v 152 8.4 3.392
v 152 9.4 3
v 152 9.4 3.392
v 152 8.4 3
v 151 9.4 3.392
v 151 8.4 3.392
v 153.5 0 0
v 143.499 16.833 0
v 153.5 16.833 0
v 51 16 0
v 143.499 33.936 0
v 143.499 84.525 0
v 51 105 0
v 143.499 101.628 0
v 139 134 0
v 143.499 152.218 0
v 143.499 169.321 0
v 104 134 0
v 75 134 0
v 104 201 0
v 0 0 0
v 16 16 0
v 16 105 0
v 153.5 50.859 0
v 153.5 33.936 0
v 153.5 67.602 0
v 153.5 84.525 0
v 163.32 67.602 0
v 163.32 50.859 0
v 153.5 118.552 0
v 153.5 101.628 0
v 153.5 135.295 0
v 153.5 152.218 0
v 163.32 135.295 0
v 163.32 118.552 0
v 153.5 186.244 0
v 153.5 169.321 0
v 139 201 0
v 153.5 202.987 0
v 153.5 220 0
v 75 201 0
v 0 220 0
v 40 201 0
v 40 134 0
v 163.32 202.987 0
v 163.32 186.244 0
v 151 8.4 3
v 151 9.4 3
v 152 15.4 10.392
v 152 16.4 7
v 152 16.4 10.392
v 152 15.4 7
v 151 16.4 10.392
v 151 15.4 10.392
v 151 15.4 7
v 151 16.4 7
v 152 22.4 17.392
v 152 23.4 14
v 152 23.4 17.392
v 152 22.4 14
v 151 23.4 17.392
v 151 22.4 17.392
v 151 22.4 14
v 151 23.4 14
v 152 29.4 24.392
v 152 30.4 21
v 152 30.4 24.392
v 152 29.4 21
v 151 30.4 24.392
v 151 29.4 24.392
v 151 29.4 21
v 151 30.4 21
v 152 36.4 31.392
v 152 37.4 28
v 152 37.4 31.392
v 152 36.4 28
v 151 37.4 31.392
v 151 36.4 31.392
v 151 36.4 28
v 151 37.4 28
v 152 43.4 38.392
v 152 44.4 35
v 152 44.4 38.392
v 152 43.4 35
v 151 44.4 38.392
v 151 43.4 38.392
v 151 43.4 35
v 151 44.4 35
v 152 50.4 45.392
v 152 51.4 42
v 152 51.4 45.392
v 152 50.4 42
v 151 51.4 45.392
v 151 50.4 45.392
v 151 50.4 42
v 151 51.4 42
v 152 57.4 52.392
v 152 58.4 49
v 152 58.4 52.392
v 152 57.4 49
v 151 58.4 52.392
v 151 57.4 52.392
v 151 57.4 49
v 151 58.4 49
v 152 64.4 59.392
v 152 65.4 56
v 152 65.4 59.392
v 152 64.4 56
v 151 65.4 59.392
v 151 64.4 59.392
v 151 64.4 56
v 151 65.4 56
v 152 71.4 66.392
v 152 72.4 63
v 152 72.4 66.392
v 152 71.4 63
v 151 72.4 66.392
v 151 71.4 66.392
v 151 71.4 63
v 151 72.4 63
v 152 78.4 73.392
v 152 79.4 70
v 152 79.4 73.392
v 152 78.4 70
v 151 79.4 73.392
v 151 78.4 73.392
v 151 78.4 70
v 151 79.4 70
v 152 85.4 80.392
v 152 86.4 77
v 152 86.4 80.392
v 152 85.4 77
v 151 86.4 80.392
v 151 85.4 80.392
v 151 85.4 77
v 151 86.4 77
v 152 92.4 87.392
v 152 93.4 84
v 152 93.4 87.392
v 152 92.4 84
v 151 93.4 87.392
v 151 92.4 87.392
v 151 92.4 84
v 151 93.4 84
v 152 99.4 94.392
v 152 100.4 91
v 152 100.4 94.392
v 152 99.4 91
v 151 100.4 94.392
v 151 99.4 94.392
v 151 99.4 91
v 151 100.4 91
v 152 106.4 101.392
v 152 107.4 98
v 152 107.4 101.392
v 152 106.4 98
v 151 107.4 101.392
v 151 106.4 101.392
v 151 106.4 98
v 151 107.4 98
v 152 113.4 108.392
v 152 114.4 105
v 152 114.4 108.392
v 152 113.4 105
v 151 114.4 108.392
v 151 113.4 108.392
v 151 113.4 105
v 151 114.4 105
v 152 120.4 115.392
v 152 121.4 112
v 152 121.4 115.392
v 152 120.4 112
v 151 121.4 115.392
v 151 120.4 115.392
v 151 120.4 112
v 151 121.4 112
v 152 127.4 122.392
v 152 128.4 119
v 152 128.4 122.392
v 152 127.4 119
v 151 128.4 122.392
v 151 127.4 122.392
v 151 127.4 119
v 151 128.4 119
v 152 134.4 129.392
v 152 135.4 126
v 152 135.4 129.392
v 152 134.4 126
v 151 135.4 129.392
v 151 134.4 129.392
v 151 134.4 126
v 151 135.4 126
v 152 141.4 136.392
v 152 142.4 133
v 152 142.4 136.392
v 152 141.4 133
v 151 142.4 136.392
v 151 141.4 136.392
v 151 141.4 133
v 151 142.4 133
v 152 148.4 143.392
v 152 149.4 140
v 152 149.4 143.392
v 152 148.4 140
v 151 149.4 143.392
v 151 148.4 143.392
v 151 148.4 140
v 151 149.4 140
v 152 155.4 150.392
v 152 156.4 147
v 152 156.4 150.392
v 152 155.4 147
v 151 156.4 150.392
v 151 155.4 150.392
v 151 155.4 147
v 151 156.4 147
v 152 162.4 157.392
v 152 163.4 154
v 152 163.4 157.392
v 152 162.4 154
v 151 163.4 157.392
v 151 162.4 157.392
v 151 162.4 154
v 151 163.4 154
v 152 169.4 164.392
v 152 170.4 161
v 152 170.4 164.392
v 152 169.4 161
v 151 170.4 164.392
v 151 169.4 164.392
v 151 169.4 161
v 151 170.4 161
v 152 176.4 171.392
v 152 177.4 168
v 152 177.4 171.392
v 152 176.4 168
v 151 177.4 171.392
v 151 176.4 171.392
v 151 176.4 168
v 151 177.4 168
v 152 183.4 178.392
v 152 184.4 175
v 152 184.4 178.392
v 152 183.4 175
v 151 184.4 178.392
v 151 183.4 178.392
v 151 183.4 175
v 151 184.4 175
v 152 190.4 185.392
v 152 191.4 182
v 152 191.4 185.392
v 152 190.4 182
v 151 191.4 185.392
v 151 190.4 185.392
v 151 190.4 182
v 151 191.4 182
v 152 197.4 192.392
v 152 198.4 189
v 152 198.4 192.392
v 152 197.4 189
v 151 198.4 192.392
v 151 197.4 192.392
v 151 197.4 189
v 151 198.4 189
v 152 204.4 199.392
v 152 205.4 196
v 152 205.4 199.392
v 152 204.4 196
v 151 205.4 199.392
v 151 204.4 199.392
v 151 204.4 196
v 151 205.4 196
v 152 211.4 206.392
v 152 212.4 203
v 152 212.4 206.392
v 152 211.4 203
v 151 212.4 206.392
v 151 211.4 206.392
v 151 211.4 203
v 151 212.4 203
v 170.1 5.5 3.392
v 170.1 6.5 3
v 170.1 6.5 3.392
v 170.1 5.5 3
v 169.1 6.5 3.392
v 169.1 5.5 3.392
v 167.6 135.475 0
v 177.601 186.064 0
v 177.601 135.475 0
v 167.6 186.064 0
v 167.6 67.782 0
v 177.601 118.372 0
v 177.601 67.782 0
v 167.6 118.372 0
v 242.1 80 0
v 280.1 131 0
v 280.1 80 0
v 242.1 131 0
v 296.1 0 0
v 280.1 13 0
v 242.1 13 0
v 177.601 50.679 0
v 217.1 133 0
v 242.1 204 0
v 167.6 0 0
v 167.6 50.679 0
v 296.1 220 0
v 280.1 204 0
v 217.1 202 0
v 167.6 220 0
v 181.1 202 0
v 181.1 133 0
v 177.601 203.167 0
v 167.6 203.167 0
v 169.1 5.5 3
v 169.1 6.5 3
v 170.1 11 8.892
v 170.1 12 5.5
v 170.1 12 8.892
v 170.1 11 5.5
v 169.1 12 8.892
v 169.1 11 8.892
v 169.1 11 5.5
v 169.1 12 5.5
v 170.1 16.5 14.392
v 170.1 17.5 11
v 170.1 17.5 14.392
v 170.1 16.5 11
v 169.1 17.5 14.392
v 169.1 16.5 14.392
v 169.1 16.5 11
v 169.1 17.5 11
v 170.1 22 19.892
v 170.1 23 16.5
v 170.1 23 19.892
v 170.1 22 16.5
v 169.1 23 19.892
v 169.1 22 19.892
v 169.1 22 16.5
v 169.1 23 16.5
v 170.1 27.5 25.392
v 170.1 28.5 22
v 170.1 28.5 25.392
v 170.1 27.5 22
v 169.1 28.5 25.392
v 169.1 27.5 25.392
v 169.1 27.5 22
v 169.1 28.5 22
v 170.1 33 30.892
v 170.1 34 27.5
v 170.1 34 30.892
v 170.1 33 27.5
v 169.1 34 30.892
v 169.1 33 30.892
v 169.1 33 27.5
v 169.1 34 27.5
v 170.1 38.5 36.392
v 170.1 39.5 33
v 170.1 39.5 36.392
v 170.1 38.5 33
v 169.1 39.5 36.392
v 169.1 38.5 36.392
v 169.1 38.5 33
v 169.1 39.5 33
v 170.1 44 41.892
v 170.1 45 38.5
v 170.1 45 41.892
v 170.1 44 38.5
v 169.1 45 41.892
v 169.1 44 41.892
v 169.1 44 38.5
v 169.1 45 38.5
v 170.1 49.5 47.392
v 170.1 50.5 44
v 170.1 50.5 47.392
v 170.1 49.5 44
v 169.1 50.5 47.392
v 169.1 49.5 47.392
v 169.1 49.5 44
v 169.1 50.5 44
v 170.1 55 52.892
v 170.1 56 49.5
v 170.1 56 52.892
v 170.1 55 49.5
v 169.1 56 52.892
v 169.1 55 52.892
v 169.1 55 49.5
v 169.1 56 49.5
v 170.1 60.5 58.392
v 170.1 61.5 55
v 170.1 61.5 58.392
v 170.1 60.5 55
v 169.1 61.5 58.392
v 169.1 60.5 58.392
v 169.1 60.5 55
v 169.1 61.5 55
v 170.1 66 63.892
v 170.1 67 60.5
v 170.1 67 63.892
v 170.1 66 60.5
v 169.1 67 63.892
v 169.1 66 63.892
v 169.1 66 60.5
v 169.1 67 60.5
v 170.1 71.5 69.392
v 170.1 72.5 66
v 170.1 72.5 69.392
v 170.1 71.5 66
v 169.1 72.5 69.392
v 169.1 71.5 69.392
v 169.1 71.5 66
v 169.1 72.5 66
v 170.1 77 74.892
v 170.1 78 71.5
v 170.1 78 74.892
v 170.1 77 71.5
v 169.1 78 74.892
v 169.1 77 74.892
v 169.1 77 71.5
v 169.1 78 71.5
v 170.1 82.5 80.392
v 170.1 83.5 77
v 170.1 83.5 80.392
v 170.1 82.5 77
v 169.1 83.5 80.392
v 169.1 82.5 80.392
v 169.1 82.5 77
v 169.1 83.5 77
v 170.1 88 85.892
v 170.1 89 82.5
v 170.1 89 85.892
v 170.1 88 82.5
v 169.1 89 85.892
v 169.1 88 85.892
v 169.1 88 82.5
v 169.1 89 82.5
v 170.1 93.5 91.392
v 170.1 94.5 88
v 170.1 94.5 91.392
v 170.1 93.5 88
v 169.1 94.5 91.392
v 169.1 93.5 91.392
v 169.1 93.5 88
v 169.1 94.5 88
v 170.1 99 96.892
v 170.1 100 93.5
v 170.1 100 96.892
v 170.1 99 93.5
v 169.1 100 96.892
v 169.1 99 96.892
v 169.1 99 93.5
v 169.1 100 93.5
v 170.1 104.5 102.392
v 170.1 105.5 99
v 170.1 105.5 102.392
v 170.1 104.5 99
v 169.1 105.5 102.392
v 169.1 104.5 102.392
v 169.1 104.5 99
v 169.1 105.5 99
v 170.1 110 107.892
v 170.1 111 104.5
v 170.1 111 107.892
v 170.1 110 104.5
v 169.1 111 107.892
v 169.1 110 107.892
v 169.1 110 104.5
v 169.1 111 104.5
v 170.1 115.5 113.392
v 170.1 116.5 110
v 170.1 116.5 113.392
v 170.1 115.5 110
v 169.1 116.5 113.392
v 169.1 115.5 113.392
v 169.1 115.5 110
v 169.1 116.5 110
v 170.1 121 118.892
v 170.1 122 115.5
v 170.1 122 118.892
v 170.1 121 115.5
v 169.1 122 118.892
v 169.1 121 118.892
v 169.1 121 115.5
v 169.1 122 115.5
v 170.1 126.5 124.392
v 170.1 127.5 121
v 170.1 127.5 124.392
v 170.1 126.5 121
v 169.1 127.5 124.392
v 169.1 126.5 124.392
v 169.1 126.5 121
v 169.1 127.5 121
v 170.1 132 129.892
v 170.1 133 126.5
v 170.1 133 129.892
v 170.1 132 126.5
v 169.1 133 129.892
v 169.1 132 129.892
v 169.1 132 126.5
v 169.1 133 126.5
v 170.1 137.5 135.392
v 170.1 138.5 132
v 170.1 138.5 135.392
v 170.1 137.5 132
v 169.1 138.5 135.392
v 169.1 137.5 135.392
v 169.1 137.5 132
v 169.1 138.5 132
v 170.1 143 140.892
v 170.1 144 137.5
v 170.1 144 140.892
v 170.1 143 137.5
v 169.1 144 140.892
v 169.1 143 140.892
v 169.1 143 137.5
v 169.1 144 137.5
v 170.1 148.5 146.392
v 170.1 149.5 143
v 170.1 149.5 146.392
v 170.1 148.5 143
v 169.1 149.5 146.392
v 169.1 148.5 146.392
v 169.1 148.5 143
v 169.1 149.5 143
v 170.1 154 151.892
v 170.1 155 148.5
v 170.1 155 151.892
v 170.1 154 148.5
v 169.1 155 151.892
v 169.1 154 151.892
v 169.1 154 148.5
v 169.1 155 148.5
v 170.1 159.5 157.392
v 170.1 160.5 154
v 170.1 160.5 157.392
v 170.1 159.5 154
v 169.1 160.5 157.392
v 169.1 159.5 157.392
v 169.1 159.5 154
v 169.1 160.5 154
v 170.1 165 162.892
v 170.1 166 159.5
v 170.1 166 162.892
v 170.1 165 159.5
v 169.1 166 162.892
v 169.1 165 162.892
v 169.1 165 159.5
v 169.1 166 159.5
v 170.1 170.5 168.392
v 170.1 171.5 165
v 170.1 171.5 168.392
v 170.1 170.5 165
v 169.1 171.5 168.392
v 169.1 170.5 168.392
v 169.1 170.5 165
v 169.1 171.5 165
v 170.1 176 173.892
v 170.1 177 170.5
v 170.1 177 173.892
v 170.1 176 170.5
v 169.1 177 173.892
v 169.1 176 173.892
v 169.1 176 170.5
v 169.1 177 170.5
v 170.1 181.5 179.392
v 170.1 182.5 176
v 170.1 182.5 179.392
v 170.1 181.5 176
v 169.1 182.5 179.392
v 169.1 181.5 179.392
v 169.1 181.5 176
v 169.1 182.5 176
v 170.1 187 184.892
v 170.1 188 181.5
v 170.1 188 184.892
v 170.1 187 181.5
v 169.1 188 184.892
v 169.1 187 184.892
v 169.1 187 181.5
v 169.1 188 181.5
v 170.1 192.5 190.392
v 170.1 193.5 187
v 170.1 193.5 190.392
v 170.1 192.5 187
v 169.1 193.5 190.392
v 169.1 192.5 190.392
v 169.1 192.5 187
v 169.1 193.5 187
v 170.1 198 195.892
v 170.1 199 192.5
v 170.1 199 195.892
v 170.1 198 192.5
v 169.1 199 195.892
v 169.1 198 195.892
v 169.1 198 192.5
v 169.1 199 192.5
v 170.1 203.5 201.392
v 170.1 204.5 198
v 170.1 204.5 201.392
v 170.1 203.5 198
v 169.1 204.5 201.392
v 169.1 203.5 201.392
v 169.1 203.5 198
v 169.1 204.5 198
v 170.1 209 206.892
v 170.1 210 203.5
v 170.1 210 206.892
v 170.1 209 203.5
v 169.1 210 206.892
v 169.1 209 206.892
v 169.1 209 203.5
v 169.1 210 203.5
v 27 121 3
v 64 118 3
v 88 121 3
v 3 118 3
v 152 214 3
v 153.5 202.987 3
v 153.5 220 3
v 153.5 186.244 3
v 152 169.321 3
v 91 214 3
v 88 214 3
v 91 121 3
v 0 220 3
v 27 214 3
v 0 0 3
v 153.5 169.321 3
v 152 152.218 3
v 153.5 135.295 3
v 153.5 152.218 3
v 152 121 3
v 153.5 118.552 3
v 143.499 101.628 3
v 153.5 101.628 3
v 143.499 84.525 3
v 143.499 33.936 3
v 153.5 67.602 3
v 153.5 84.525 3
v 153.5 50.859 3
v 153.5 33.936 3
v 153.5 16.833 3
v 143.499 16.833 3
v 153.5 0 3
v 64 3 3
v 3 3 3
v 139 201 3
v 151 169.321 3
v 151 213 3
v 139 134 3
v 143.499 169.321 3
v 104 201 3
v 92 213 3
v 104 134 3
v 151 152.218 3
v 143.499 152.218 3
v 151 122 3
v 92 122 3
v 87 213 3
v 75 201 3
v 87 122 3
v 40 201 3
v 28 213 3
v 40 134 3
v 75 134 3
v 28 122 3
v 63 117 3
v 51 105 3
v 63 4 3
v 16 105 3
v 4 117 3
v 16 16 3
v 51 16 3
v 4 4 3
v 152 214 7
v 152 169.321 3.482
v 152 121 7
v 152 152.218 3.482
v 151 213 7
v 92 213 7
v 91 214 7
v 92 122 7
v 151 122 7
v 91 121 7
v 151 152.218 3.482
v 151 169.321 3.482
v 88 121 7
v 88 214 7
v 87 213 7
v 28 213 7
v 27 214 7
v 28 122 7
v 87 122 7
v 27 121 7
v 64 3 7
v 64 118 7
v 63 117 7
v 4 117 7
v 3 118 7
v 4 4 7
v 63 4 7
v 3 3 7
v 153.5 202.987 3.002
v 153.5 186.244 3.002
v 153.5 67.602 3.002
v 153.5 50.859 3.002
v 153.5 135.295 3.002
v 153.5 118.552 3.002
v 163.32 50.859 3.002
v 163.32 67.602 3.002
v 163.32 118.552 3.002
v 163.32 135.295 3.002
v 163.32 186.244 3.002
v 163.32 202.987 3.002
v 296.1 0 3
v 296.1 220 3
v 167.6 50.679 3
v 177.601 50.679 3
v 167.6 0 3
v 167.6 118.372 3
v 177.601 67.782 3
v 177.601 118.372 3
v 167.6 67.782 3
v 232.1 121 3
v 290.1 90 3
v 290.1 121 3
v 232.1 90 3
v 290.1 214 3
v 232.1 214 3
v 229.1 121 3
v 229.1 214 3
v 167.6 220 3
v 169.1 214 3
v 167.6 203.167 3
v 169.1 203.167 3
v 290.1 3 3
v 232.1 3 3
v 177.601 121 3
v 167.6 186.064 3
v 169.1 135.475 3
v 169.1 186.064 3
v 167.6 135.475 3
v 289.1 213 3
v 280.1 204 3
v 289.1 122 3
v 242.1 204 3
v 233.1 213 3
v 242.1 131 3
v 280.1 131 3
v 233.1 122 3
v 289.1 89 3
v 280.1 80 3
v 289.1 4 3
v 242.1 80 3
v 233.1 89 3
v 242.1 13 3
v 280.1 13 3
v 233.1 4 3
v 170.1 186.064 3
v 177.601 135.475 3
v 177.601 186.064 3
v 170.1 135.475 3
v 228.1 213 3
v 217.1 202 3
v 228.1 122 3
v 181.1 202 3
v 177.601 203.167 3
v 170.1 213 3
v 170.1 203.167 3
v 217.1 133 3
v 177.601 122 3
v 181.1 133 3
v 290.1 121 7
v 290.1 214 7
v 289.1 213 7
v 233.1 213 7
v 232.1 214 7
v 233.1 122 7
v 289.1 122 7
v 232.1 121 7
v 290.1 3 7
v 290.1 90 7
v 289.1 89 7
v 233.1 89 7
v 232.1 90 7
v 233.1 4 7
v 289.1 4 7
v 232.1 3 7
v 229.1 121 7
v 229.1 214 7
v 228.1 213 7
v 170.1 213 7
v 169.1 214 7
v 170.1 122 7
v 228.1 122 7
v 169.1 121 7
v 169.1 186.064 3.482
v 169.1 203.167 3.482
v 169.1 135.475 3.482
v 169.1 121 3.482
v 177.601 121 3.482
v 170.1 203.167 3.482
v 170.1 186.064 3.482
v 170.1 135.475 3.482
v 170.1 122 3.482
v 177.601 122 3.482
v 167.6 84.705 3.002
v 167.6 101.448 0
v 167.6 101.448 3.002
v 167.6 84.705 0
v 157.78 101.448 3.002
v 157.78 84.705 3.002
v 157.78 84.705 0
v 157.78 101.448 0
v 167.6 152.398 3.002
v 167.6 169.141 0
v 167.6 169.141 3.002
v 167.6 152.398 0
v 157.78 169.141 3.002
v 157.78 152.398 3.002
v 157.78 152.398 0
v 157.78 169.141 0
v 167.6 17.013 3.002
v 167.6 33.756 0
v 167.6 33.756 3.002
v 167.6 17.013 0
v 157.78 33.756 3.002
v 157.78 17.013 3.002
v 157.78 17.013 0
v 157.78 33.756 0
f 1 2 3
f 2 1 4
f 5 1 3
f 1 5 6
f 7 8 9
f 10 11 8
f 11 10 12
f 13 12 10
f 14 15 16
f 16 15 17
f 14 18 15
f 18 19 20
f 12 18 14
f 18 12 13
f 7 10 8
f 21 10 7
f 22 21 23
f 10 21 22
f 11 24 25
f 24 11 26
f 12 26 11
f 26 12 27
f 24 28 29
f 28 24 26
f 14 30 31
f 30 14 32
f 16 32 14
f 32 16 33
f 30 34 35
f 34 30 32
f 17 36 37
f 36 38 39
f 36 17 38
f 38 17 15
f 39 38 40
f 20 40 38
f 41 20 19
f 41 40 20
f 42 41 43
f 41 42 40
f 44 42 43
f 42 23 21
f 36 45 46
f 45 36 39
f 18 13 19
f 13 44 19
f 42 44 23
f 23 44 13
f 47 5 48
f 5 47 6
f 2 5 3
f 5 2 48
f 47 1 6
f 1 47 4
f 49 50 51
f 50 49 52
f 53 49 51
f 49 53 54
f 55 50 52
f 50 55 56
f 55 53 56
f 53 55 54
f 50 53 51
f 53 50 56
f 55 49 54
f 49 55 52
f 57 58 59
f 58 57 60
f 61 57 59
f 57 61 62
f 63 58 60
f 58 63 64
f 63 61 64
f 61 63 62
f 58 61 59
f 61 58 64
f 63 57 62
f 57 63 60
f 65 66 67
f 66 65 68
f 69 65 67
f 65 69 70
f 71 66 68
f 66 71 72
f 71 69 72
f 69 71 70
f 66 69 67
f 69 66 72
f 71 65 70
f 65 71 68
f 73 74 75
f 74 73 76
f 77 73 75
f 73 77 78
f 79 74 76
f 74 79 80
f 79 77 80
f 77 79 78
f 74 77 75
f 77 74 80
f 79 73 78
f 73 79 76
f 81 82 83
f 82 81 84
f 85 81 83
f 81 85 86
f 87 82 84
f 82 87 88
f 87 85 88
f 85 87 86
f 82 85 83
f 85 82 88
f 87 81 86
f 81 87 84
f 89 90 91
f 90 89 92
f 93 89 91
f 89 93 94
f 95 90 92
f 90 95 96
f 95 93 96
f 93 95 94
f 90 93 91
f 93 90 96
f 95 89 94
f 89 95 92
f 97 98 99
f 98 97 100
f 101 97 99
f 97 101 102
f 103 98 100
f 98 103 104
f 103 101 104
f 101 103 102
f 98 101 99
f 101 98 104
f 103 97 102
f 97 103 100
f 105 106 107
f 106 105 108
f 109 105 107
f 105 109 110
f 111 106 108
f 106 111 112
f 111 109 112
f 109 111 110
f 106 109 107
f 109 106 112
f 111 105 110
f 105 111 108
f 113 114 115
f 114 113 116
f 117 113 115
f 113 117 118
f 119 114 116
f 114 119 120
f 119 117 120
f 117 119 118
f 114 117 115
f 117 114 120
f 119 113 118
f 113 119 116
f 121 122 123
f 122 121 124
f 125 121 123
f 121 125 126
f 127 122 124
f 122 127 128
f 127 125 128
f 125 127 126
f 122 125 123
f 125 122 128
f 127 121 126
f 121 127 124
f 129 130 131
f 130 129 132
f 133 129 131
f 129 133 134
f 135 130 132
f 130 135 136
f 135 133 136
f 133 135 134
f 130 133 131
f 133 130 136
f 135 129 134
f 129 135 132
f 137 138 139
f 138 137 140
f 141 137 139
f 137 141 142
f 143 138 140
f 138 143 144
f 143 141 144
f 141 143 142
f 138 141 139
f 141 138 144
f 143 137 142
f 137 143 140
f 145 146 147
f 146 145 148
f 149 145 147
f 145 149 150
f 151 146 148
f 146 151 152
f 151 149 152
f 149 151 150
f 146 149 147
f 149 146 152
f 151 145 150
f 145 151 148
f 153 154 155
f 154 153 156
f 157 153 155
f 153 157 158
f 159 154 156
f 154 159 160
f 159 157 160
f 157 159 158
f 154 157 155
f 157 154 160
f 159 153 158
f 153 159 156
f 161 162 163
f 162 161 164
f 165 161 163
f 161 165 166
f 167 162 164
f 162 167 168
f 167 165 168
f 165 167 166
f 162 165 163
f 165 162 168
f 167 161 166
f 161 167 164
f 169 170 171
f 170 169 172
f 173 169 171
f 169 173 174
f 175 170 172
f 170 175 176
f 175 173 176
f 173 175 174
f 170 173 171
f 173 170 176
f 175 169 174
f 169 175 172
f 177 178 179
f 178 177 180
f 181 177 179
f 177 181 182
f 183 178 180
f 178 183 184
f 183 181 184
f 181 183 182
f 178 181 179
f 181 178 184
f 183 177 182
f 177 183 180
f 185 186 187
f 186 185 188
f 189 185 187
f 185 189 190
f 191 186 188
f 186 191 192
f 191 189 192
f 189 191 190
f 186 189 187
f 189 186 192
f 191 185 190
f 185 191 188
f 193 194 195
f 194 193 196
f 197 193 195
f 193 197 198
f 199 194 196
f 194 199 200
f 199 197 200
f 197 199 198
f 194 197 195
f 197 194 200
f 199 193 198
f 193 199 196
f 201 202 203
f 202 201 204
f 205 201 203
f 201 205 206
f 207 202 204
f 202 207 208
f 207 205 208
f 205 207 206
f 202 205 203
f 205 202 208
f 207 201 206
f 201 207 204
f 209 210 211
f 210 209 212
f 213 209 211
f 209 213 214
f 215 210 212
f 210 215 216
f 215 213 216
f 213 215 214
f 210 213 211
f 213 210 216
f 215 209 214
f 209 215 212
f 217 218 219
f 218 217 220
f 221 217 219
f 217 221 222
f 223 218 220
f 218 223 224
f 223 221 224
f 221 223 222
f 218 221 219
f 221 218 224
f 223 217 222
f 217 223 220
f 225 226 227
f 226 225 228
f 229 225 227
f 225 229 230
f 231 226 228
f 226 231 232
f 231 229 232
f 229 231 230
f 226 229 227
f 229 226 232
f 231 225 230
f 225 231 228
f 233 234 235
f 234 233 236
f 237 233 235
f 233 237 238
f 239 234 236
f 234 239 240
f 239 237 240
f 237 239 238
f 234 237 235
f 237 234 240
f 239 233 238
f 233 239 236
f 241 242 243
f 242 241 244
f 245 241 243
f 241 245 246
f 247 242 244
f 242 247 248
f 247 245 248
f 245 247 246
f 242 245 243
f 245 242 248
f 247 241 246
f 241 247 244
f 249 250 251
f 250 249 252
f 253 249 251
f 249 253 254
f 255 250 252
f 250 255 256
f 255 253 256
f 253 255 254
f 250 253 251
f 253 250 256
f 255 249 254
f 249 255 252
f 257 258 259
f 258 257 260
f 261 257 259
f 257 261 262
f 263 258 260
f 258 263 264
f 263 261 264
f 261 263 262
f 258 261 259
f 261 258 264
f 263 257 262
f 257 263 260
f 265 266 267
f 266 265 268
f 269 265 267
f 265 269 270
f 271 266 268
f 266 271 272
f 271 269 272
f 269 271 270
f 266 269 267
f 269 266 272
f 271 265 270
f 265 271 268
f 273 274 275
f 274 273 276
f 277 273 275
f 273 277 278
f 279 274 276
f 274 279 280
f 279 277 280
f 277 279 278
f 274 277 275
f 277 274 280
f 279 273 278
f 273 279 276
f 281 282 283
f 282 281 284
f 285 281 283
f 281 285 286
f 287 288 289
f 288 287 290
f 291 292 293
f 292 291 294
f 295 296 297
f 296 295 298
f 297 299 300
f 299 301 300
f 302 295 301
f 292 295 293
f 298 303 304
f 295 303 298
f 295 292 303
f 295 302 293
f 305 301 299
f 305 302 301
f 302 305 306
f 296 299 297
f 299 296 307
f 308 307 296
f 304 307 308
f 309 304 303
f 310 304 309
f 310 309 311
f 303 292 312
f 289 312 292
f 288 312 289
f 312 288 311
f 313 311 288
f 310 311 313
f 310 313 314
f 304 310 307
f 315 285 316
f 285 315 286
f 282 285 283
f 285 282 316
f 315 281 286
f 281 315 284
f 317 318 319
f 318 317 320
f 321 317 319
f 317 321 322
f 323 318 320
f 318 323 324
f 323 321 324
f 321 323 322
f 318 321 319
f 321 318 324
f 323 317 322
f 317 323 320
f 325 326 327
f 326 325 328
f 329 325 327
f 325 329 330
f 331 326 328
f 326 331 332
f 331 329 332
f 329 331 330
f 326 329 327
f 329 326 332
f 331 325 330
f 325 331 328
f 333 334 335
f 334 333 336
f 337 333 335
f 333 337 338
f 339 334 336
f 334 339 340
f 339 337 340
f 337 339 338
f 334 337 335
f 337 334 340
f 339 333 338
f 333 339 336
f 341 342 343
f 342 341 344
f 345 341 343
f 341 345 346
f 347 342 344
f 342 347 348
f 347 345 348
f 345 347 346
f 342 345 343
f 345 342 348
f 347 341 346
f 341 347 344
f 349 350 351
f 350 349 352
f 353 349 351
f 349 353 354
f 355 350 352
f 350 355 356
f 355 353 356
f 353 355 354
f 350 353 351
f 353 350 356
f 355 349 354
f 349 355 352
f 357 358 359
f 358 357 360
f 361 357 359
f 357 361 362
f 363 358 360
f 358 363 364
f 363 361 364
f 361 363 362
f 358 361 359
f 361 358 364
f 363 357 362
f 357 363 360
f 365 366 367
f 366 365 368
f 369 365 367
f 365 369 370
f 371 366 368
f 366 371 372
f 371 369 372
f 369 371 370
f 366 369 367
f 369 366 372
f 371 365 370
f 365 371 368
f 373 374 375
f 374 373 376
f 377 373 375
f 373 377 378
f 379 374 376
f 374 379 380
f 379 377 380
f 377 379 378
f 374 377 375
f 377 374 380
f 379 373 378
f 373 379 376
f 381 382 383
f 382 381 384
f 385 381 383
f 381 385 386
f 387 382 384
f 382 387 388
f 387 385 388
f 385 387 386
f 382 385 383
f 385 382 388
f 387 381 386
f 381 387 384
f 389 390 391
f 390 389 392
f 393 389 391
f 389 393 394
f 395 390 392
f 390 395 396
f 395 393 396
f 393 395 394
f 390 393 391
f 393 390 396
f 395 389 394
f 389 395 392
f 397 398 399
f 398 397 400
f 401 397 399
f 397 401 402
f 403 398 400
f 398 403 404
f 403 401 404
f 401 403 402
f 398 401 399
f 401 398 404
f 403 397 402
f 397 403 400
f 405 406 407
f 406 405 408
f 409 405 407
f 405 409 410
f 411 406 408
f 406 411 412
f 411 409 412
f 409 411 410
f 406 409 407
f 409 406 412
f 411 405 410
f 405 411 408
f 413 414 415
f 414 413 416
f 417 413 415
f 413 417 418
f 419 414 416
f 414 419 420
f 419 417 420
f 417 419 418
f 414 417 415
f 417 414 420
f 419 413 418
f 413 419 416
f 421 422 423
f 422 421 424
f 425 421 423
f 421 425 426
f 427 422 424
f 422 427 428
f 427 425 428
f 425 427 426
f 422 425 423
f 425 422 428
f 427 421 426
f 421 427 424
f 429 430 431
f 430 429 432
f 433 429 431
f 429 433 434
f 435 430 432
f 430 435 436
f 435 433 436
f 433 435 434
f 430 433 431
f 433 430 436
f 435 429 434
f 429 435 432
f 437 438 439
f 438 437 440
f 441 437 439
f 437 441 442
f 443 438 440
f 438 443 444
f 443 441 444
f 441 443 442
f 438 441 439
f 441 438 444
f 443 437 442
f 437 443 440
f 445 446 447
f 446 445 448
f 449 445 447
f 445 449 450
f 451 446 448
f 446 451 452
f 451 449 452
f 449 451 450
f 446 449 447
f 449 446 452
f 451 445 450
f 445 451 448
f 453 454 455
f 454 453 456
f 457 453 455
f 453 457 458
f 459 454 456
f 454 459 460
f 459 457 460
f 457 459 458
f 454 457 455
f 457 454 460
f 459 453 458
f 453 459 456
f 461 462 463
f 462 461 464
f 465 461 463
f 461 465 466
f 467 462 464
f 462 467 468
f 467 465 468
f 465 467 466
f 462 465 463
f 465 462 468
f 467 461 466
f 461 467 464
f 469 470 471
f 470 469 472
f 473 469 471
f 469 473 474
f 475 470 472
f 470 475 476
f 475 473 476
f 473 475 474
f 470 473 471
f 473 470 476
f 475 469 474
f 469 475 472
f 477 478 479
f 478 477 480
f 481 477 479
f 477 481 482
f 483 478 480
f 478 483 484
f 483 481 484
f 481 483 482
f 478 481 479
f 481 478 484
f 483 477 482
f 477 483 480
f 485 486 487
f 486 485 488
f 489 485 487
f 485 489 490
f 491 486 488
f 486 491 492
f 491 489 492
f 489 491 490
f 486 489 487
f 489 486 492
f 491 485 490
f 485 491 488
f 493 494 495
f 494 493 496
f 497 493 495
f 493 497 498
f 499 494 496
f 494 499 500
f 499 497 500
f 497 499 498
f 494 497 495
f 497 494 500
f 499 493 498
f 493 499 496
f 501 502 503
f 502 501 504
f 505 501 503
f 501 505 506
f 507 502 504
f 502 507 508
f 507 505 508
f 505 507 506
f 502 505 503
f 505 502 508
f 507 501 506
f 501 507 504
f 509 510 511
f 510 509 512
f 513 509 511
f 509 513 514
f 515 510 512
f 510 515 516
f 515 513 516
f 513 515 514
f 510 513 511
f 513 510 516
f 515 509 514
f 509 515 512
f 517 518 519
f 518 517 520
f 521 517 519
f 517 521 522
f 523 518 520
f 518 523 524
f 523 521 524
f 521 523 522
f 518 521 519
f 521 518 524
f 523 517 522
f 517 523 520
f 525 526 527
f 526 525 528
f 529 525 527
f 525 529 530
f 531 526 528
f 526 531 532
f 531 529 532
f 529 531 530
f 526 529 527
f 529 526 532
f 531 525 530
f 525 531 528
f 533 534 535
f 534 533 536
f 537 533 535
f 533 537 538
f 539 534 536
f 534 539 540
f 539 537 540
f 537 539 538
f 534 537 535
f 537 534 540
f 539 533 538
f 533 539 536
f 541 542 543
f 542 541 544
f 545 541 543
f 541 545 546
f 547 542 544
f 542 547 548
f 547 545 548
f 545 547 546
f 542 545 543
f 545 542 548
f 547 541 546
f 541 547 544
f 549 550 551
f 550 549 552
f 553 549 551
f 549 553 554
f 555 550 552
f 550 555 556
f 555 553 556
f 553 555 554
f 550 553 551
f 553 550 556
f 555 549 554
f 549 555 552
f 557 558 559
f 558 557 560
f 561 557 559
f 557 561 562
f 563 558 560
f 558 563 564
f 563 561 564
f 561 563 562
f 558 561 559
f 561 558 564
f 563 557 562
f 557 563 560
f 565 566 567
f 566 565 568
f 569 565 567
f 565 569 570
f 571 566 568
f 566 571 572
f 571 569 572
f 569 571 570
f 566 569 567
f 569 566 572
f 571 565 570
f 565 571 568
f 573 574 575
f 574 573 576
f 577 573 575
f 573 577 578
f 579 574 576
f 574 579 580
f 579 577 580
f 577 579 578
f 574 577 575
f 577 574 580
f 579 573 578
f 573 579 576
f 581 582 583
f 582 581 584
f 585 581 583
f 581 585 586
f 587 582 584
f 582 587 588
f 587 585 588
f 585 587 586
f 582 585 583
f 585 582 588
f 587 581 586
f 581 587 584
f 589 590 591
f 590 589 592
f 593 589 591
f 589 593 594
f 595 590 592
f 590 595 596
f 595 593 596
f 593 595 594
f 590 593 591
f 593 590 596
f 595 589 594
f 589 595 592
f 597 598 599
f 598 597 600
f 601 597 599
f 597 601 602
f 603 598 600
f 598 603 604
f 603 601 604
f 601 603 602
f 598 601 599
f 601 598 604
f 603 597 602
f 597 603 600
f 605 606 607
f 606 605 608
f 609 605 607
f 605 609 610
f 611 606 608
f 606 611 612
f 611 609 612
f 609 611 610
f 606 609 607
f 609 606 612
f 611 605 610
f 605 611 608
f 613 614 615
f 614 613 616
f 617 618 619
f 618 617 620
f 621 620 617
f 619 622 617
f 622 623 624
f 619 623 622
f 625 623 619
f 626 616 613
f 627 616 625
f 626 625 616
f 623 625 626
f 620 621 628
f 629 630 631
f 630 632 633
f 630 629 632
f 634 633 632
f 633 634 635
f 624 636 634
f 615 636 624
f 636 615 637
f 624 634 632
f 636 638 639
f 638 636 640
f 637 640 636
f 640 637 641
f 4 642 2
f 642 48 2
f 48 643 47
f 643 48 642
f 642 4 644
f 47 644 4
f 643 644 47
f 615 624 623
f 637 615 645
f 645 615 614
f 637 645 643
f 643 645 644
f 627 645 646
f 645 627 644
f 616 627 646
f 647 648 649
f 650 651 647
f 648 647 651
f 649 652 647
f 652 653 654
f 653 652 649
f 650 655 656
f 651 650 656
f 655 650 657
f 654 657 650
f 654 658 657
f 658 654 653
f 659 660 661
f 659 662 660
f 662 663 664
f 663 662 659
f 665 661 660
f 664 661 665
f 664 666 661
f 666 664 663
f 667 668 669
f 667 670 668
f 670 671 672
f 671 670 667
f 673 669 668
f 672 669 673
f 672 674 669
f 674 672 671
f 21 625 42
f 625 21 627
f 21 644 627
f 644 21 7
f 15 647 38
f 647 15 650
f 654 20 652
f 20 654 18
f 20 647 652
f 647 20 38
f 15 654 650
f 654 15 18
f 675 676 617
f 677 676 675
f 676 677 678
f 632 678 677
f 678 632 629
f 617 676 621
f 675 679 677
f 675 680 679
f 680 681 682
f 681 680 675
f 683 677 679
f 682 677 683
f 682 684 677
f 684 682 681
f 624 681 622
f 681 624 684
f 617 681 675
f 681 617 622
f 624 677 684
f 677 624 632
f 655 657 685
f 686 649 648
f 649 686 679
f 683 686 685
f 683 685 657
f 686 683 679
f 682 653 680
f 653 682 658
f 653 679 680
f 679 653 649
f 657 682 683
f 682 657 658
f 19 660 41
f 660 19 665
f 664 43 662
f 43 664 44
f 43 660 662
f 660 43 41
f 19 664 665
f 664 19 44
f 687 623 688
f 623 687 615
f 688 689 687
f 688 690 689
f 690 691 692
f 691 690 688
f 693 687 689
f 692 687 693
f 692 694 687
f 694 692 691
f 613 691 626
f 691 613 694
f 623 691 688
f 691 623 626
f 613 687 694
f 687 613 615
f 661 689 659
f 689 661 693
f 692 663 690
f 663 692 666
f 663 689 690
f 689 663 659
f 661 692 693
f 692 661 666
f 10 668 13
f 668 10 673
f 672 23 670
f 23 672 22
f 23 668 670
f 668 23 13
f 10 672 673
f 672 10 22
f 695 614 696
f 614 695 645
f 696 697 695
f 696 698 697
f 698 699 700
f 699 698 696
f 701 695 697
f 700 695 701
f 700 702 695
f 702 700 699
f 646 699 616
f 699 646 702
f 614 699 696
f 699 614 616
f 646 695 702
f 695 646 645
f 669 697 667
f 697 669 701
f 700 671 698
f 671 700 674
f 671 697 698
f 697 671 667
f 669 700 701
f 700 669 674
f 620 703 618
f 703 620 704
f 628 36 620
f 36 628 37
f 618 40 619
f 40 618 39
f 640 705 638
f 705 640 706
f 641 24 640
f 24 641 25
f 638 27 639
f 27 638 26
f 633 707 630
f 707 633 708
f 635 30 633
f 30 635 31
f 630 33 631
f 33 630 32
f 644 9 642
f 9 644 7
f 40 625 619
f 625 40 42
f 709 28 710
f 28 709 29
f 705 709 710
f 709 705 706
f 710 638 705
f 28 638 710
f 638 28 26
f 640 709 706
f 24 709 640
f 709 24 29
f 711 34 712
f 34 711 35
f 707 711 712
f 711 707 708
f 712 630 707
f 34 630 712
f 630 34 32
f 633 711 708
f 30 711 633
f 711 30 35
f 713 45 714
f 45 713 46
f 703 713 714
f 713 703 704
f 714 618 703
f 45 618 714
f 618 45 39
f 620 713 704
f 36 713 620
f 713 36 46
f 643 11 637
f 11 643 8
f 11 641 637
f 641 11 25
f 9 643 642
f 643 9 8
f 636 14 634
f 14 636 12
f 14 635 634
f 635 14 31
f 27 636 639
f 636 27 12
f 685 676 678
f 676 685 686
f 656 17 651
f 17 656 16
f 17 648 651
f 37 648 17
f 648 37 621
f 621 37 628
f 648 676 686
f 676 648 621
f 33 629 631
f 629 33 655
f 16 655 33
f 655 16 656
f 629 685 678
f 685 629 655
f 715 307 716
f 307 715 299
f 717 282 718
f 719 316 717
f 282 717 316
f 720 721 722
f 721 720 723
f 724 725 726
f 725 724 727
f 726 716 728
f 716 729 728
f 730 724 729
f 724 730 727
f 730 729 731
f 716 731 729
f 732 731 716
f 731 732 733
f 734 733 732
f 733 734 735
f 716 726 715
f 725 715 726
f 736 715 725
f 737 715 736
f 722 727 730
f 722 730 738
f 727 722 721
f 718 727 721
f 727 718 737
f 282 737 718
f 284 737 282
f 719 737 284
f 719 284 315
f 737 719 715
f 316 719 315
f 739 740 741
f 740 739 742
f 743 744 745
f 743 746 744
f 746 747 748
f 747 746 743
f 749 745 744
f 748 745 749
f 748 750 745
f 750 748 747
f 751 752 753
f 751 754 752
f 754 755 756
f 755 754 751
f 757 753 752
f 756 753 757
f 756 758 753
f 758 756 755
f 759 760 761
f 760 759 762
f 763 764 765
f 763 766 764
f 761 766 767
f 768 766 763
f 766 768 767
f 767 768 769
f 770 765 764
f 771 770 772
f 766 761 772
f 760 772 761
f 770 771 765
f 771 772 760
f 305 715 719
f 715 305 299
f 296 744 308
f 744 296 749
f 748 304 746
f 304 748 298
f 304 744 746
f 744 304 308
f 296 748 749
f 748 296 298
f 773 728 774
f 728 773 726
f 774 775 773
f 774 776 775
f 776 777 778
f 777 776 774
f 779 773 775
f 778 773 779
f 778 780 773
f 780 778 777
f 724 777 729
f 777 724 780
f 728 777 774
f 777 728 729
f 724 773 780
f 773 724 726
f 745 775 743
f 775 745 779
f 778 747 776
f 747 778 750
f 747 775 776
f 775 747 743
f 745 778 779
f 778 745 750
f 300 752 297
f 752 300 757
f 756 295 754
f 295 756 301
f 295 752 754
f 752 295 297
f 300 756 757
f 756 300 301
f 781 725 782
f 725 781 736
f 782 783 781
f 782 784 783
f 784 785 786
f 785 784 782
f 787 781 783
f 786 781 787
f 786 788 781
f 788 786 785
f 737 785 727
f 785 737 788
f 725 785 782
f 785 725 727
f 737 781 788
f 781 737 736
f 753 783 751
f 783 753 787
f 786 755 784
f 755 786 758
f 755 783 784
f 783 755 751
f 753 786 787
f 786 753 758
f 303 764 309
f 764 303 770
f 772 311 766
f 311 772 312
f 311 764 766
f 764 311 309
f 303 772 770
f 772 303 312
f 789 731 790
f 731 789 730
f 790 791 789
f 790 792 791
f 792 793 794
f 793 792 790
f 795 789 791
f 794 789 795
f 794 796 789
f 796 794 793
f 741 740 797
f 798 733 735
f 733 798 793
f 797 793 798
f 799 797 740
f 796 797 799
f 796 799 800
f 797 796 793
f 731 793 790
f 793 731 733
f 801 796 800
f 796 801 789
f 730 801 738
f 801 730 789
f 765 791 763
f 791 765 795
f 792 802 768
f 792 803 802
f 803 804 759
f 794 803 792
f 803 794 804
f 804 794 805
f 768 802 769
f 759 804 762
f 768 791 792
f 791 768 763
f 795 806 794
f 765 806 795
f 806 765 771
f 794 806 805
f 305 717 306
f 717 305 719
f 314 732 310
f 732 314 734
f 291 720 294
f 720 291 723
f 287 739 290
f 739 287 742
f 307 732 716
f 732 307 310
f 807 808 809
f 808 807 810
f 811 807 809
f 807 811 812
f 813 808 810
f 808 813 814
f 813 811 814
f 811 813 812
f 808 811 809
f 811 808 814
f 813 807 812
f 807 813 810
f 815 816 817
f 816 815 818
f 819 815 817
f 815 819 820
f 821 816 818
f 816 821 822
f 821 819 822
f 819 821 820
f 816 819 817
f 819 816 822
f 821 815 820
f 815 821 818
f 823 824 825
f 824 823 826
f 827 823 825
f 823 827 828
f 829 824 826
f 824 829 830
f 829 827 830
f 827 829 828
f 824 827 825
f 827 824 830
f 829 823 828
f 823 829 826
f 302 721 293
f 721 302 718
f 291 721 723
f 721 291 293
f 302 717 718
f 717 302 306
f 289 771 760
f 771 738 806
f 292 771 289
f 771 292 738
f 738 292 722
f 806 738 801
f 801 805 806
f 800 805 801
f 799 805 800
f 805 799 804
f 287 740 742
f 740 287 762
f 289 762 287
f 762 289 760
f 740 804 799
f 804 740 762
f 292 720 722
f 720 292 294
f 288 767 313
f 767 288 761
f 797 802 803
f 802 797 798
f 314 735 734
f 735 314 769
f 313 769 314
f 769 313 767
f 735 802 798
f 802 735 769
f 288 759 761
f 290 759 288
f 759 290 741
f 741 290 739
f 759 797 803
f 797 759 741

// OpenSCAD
use <mylib.scad>;
p = .001;
pp = 2 * p;

// children(0) - base plate
// children(1) - motif to subtract 
// txyz: [x, y, z] initial offset
// dxyz: [dx, dy, dz] delta per iteration
// mxyz: [mx, my, mz] max value of iteration
module perforate(txyz, dxyz, mxyz) {
  // echo("perf: x,y,z=", [ txyz, dxyz, mxyz ]) //
  difference() {
    children(0);
    for (x = [txyz[0]:dxyz[0]:mxyz[0]], //
         y = [txyz[1]:dxyz[1]:mxyz[1]], //
         z = [txyz[2]:dxyz[2]:mxyz[2]]) //
      translate([ x, y, z ]) children(1);
  }
}

tb = 3; // thickness of base
h = 4; // height of 'wall' on lid
tw = 1; // thickness of 'wall' on lid
ta = 3; // thickness of acrylic walls
cardw = 54;
cardh = 81;

// xx: size on x-axis (outer size)
// yy: size on y-axis
// x0: left of cell
// y0: top of cell
module cell(xx, yy, x0=0, y0=0, card = true) {
  if (card) {
    difference() {
      cw = 2 * (cardw - 3) - xx; dw = (xx - cw) / 2; 
      dh = dw; ch = yy - 2* dh;
      assert(dw + cw < cardw - 2);
      children(0);
      translate([x0+dw, y0+dh, -.5*tb]) cube([cw, ch, 2*tb]);
    }
    translate([x0+ta, y0+ta, 0])
    box([xx-2*ta, yy-2*ta, h+tb], [tw, tw, -1.5], [2, 2, 4]);
  } else {
    children(0);
  }
}

module cells() {
  r2 = 220-121;
  y2 = 220-118;
  w2 = 24;
  // translate([0,0, tb-p]) {
    cell(67, 121, 0,  0)       // Ore cell
    // parts bins:
    // cell(78, 60, 64,  0, false)       // player A
    // cell(79, 60, 139, 0, false)       // player B
    // cell(78, 64, 64, 57, false)       // player C
    // cell(79, 64, 139, 57, false)      // player D

    // cell(t0+w2, r2, 0, 118)     // dice & robber
    cell(91-w2, r2, w2, 118)    // wheat
    cell(155-88, r2, 88, 118)   // sheep
    cell(218-152, r2, 152, 118) // wood-brick

    cell(64, 93, 215)           // dev cards
    // cell(64, 118-90+t0, 215, 90); // hex markers
    cell(64, r2, 215, 118)      // brick-wood
    children(0);
  // }
}

module base(dx = 20, dy = 20, dz = tb) {
  cube([dx, dy, dz]);
}
// v: depth of underlying plate (dist between peg and top disk)
// d: thickness of top disk
// r: radius of top disk
module pegPlate(v = 3, d = 2, r = 5, f = .5) {
  r0 = 2.5; // peg radius
  children(0);
  cylinder(h = v+v+p, r = r0, $fn = 30); // post
  dr = .6; dzr = .33; dzz = .6 * dr*dzr; // start the enlarge a bit below the top plate
 % for (rp = [r0 : dr : r]) let ( dz = (rp - r0)*dzr) 
    // echo("r, rp, dr, dz=", r, rp, dr, dz )
    translate([0, 0, v+v+dz-dzz]) cylinder(h = d-dz+dzz, r = rp, $fn = 30); // collar
    rp = r; dz = (rp - r0)*dzr;
    translate([0, 0, v+v+dz-dzz]) cylinder(h = d-dz+dzz, r = rp, $fn = 30); // collar
}
// cut a circle and slot
// tr: translate to center of circle ([0, 0, 0])
// ds: translate from post to extend slot ([-2*r, 0, 0])
// v: thickness of plate 
module matingSlot(tr = [0,0,0], ds, v = 3, r = 5, f = .5, r0 = 2.5) {
  ds = is_undef(ds) ? [-(r+r), 0, 0] : ds;
  difference() {
    children(0);
    translate(adif(tr, [0,0,p])) {
      cylinder(h = v * 2, r = r+f);  // hole
      hull() {
        cylinder(h = v+pp, r = r0, $fn=30); // post
        translate(ds)  cylinder(h = v+pp, r = r0+f, $fn=30);
      }
    }
  }
}

module cut_ls(txyz = [0, 0, 0]) {
  translate(txyz)
  intersection() {
    children(0);
    children(1);
  }
}
module cut_rs(txyz=[0, 0, 0]) {
  translate(txyz)
  intersection() {
    children(0);
    children(1);
  }
}


// split base into ls & rs
// txyz: translate for rs
// ls: children(0)
// rs: children(1)
// base: children(2)
module cut(txyz) {
  echo("cut: txyz=", txyz);
  cut_ls(    ) { children(0); children(2); }
  cut_rs(txyz) { children(1); children(2); }
}

f = .18;
// cut plate in two; make slots and tabs @ cx
// children(0): base object
// tr: translate bb to base (put z on midline for tabs/slots)
// bb: big block, size of base object
// cx: x-coord to make the cut (through YZ plane)
// txyz: translate rs
// z0: midline to place the tabs/slots
// dsz: differential offset from midline of tabs/slots
// sz: thickness of tab/slot
// sy0: breadth of tab (bb[1]/(4*ns+1))
// sx: insertion depth of tab (10)
// fs, ft: (f) shrinkage of slot & tab applied to sx, sy, sz
// ns: (3) number of tabs per side
// ambient
// f: shrinkage (.35)
module zipper_x(bb, tr, cx, txyz, z0, dsz = 0, sz, sy0, sx, fs = f, ft = f, ns = 3) {
  fs = is_undef(fs) ? f : fs;
  fsxyz = is_list(fs) ? fs : [fs, fs, fs];
  tr = is_undef(tr) ? [0, 0, 0] : tr;
  txyz = is_undef(txyz) ? [cx, 0, 0] : txyz;
  z0 = is_undef(z0) ? bb[2] / 2 : z0;
  // ns = 3;
  sx = is_undef(sx) ? 10 : sx;   // penetration depth of slot/tab
  dy = bb[1] / (4 * ns+1);    // default for sy
  // sy = bb[1] / (4 * ns+1); // sy solid : sy tab : sy solid : sy slot ... sy solid
  sy = is_undef(sy0) ? dy : sy0; // width of slot/tab (+/- f)
  sz = is_undef(sz) ? 1 : sz;
  echo("zipper: bb, tr, cx, txyz, dsz, sz =", bb, tr, cx, txyz, dsz, sz);
  echo("zipper: ns, sx, sy, sz, f =", ns, sx, sy, sz, f);
  // add tabs to children(ch) ch: 0(ls) OR 1(rs)
  module addTabs(cx, ch = 0) {
    union() {
      children(0);
      for (i = [0 : ns - 1]) let (ii = (4 * i + 4.5+ch) % (ns * 4)) 
        translate([cx - ch*(sx - ft)/2 , (ii) * sy, z0 + ch * dsz])
      color("pink")  cube([(sx - ft), sy - ft, sz - ft], true);
    }
  }
  // cut slots in children(0)
  module cutSlots(cx, ch = 0) {
    difference() {
      children(0);
      for (i = [0 : ns - 1])
        translate([cx + ch*(sx - 0*fsxyz[0])/2, (4 * i + 2.5+ch) * sy, z0 - ch * dsz])
      #  cube([(sx - 0*fsxyz[0]) + pp, sy + fsxyz[1], sz + fsxyz[2]], true);
    }
  }
  // add tabs & slots
  module addSlots_Tabs() {
    // ls
    cutSlots(cx, -1) 
    addTabs(cx, -1) 
    children(0);
    // rs
    cutSlots(cx + txyz[0], 1)
    addTabs(cx + txyz[0], 1)
    children(1);
  }

  // cut children(0) in 2 pieces, addSlots_Tabs to each side
  addSlots_Tabs() {
    echo("addSlots_Tabs: tr, txyz", tr, txyz)
    // ls, tr(rs)
    intersection() // create ls
    {
      translate(tr) cube([cx, bb[1], bb[2]]);
      children(0);
    };
    translate(txyz) 
    intersection() // create rs
    {
      translate([cx, 0, 0]) translate(tr) cube([bb[0]-cx, bb[1], bb[2]]);
      children(0);
    }
  }
}

// peg & slot demo:
// v = 3;
// matingSlot([10, -17.5, 0])
// pegPlate()
// translate([0, -7.5, 0]) base(40, 40, v);

// *translate([-7.5,-7.5, v+.2]) // color("blue") 
// matingSlot([7.5, 7.5, 0], [0, 10, 0], 3, 5, .5)
//  cube([15, 25, v]);

loc = 0;
gs = 16;
cx = 153.5; tx = 282; bby = 220; bbz = 10;

module base_cells() {
  cells()
  // perforate([gs, gs, 0], [gs, gs, 1], [280-gs, 222-gs, 1]) 
  {
    color("lightblue") 
    base(tx, 222, tb);
    // cube([gs/2, gs/2, gs/2+tb], true); // pattern to cut
  }
}

// intersection() 
{
  ddx = 14.1; // separate ls & rs
  sz = tb + pp;  // thickness of tab
  fsz = f + .6;
  // translate(v = [cx+ddx/2, bby-35, 0])  cube([50, 150, 20], true);
  union() {
  ccx = cx - .5; k = 2.; dia = 1.; y0 = 6;
  posts(sz+fsz/2 ,[ccx - k,       y0+2.4, 0], [0, 7, 0], (bby-y0)/7, dia);
  posts(sz+fsz/2 ,[ccx + k + ddx, y0-.5, 0], [0, 5.5, 0], (bby-y0)/5.5, dia);
  zipper_x([tx, bby, 10], [0, 0, -p], cx, [ddx, 0, 0], z0 = 0 + (sz)/2, dsz = 0, sz = sz+f, ns = 3, fs = [f, f, fsz])
  base_cells();
  }
}

atrans(loc, [undef, undef, [0, -2, 6]]) 
 % cube([220, 220, 1]);
